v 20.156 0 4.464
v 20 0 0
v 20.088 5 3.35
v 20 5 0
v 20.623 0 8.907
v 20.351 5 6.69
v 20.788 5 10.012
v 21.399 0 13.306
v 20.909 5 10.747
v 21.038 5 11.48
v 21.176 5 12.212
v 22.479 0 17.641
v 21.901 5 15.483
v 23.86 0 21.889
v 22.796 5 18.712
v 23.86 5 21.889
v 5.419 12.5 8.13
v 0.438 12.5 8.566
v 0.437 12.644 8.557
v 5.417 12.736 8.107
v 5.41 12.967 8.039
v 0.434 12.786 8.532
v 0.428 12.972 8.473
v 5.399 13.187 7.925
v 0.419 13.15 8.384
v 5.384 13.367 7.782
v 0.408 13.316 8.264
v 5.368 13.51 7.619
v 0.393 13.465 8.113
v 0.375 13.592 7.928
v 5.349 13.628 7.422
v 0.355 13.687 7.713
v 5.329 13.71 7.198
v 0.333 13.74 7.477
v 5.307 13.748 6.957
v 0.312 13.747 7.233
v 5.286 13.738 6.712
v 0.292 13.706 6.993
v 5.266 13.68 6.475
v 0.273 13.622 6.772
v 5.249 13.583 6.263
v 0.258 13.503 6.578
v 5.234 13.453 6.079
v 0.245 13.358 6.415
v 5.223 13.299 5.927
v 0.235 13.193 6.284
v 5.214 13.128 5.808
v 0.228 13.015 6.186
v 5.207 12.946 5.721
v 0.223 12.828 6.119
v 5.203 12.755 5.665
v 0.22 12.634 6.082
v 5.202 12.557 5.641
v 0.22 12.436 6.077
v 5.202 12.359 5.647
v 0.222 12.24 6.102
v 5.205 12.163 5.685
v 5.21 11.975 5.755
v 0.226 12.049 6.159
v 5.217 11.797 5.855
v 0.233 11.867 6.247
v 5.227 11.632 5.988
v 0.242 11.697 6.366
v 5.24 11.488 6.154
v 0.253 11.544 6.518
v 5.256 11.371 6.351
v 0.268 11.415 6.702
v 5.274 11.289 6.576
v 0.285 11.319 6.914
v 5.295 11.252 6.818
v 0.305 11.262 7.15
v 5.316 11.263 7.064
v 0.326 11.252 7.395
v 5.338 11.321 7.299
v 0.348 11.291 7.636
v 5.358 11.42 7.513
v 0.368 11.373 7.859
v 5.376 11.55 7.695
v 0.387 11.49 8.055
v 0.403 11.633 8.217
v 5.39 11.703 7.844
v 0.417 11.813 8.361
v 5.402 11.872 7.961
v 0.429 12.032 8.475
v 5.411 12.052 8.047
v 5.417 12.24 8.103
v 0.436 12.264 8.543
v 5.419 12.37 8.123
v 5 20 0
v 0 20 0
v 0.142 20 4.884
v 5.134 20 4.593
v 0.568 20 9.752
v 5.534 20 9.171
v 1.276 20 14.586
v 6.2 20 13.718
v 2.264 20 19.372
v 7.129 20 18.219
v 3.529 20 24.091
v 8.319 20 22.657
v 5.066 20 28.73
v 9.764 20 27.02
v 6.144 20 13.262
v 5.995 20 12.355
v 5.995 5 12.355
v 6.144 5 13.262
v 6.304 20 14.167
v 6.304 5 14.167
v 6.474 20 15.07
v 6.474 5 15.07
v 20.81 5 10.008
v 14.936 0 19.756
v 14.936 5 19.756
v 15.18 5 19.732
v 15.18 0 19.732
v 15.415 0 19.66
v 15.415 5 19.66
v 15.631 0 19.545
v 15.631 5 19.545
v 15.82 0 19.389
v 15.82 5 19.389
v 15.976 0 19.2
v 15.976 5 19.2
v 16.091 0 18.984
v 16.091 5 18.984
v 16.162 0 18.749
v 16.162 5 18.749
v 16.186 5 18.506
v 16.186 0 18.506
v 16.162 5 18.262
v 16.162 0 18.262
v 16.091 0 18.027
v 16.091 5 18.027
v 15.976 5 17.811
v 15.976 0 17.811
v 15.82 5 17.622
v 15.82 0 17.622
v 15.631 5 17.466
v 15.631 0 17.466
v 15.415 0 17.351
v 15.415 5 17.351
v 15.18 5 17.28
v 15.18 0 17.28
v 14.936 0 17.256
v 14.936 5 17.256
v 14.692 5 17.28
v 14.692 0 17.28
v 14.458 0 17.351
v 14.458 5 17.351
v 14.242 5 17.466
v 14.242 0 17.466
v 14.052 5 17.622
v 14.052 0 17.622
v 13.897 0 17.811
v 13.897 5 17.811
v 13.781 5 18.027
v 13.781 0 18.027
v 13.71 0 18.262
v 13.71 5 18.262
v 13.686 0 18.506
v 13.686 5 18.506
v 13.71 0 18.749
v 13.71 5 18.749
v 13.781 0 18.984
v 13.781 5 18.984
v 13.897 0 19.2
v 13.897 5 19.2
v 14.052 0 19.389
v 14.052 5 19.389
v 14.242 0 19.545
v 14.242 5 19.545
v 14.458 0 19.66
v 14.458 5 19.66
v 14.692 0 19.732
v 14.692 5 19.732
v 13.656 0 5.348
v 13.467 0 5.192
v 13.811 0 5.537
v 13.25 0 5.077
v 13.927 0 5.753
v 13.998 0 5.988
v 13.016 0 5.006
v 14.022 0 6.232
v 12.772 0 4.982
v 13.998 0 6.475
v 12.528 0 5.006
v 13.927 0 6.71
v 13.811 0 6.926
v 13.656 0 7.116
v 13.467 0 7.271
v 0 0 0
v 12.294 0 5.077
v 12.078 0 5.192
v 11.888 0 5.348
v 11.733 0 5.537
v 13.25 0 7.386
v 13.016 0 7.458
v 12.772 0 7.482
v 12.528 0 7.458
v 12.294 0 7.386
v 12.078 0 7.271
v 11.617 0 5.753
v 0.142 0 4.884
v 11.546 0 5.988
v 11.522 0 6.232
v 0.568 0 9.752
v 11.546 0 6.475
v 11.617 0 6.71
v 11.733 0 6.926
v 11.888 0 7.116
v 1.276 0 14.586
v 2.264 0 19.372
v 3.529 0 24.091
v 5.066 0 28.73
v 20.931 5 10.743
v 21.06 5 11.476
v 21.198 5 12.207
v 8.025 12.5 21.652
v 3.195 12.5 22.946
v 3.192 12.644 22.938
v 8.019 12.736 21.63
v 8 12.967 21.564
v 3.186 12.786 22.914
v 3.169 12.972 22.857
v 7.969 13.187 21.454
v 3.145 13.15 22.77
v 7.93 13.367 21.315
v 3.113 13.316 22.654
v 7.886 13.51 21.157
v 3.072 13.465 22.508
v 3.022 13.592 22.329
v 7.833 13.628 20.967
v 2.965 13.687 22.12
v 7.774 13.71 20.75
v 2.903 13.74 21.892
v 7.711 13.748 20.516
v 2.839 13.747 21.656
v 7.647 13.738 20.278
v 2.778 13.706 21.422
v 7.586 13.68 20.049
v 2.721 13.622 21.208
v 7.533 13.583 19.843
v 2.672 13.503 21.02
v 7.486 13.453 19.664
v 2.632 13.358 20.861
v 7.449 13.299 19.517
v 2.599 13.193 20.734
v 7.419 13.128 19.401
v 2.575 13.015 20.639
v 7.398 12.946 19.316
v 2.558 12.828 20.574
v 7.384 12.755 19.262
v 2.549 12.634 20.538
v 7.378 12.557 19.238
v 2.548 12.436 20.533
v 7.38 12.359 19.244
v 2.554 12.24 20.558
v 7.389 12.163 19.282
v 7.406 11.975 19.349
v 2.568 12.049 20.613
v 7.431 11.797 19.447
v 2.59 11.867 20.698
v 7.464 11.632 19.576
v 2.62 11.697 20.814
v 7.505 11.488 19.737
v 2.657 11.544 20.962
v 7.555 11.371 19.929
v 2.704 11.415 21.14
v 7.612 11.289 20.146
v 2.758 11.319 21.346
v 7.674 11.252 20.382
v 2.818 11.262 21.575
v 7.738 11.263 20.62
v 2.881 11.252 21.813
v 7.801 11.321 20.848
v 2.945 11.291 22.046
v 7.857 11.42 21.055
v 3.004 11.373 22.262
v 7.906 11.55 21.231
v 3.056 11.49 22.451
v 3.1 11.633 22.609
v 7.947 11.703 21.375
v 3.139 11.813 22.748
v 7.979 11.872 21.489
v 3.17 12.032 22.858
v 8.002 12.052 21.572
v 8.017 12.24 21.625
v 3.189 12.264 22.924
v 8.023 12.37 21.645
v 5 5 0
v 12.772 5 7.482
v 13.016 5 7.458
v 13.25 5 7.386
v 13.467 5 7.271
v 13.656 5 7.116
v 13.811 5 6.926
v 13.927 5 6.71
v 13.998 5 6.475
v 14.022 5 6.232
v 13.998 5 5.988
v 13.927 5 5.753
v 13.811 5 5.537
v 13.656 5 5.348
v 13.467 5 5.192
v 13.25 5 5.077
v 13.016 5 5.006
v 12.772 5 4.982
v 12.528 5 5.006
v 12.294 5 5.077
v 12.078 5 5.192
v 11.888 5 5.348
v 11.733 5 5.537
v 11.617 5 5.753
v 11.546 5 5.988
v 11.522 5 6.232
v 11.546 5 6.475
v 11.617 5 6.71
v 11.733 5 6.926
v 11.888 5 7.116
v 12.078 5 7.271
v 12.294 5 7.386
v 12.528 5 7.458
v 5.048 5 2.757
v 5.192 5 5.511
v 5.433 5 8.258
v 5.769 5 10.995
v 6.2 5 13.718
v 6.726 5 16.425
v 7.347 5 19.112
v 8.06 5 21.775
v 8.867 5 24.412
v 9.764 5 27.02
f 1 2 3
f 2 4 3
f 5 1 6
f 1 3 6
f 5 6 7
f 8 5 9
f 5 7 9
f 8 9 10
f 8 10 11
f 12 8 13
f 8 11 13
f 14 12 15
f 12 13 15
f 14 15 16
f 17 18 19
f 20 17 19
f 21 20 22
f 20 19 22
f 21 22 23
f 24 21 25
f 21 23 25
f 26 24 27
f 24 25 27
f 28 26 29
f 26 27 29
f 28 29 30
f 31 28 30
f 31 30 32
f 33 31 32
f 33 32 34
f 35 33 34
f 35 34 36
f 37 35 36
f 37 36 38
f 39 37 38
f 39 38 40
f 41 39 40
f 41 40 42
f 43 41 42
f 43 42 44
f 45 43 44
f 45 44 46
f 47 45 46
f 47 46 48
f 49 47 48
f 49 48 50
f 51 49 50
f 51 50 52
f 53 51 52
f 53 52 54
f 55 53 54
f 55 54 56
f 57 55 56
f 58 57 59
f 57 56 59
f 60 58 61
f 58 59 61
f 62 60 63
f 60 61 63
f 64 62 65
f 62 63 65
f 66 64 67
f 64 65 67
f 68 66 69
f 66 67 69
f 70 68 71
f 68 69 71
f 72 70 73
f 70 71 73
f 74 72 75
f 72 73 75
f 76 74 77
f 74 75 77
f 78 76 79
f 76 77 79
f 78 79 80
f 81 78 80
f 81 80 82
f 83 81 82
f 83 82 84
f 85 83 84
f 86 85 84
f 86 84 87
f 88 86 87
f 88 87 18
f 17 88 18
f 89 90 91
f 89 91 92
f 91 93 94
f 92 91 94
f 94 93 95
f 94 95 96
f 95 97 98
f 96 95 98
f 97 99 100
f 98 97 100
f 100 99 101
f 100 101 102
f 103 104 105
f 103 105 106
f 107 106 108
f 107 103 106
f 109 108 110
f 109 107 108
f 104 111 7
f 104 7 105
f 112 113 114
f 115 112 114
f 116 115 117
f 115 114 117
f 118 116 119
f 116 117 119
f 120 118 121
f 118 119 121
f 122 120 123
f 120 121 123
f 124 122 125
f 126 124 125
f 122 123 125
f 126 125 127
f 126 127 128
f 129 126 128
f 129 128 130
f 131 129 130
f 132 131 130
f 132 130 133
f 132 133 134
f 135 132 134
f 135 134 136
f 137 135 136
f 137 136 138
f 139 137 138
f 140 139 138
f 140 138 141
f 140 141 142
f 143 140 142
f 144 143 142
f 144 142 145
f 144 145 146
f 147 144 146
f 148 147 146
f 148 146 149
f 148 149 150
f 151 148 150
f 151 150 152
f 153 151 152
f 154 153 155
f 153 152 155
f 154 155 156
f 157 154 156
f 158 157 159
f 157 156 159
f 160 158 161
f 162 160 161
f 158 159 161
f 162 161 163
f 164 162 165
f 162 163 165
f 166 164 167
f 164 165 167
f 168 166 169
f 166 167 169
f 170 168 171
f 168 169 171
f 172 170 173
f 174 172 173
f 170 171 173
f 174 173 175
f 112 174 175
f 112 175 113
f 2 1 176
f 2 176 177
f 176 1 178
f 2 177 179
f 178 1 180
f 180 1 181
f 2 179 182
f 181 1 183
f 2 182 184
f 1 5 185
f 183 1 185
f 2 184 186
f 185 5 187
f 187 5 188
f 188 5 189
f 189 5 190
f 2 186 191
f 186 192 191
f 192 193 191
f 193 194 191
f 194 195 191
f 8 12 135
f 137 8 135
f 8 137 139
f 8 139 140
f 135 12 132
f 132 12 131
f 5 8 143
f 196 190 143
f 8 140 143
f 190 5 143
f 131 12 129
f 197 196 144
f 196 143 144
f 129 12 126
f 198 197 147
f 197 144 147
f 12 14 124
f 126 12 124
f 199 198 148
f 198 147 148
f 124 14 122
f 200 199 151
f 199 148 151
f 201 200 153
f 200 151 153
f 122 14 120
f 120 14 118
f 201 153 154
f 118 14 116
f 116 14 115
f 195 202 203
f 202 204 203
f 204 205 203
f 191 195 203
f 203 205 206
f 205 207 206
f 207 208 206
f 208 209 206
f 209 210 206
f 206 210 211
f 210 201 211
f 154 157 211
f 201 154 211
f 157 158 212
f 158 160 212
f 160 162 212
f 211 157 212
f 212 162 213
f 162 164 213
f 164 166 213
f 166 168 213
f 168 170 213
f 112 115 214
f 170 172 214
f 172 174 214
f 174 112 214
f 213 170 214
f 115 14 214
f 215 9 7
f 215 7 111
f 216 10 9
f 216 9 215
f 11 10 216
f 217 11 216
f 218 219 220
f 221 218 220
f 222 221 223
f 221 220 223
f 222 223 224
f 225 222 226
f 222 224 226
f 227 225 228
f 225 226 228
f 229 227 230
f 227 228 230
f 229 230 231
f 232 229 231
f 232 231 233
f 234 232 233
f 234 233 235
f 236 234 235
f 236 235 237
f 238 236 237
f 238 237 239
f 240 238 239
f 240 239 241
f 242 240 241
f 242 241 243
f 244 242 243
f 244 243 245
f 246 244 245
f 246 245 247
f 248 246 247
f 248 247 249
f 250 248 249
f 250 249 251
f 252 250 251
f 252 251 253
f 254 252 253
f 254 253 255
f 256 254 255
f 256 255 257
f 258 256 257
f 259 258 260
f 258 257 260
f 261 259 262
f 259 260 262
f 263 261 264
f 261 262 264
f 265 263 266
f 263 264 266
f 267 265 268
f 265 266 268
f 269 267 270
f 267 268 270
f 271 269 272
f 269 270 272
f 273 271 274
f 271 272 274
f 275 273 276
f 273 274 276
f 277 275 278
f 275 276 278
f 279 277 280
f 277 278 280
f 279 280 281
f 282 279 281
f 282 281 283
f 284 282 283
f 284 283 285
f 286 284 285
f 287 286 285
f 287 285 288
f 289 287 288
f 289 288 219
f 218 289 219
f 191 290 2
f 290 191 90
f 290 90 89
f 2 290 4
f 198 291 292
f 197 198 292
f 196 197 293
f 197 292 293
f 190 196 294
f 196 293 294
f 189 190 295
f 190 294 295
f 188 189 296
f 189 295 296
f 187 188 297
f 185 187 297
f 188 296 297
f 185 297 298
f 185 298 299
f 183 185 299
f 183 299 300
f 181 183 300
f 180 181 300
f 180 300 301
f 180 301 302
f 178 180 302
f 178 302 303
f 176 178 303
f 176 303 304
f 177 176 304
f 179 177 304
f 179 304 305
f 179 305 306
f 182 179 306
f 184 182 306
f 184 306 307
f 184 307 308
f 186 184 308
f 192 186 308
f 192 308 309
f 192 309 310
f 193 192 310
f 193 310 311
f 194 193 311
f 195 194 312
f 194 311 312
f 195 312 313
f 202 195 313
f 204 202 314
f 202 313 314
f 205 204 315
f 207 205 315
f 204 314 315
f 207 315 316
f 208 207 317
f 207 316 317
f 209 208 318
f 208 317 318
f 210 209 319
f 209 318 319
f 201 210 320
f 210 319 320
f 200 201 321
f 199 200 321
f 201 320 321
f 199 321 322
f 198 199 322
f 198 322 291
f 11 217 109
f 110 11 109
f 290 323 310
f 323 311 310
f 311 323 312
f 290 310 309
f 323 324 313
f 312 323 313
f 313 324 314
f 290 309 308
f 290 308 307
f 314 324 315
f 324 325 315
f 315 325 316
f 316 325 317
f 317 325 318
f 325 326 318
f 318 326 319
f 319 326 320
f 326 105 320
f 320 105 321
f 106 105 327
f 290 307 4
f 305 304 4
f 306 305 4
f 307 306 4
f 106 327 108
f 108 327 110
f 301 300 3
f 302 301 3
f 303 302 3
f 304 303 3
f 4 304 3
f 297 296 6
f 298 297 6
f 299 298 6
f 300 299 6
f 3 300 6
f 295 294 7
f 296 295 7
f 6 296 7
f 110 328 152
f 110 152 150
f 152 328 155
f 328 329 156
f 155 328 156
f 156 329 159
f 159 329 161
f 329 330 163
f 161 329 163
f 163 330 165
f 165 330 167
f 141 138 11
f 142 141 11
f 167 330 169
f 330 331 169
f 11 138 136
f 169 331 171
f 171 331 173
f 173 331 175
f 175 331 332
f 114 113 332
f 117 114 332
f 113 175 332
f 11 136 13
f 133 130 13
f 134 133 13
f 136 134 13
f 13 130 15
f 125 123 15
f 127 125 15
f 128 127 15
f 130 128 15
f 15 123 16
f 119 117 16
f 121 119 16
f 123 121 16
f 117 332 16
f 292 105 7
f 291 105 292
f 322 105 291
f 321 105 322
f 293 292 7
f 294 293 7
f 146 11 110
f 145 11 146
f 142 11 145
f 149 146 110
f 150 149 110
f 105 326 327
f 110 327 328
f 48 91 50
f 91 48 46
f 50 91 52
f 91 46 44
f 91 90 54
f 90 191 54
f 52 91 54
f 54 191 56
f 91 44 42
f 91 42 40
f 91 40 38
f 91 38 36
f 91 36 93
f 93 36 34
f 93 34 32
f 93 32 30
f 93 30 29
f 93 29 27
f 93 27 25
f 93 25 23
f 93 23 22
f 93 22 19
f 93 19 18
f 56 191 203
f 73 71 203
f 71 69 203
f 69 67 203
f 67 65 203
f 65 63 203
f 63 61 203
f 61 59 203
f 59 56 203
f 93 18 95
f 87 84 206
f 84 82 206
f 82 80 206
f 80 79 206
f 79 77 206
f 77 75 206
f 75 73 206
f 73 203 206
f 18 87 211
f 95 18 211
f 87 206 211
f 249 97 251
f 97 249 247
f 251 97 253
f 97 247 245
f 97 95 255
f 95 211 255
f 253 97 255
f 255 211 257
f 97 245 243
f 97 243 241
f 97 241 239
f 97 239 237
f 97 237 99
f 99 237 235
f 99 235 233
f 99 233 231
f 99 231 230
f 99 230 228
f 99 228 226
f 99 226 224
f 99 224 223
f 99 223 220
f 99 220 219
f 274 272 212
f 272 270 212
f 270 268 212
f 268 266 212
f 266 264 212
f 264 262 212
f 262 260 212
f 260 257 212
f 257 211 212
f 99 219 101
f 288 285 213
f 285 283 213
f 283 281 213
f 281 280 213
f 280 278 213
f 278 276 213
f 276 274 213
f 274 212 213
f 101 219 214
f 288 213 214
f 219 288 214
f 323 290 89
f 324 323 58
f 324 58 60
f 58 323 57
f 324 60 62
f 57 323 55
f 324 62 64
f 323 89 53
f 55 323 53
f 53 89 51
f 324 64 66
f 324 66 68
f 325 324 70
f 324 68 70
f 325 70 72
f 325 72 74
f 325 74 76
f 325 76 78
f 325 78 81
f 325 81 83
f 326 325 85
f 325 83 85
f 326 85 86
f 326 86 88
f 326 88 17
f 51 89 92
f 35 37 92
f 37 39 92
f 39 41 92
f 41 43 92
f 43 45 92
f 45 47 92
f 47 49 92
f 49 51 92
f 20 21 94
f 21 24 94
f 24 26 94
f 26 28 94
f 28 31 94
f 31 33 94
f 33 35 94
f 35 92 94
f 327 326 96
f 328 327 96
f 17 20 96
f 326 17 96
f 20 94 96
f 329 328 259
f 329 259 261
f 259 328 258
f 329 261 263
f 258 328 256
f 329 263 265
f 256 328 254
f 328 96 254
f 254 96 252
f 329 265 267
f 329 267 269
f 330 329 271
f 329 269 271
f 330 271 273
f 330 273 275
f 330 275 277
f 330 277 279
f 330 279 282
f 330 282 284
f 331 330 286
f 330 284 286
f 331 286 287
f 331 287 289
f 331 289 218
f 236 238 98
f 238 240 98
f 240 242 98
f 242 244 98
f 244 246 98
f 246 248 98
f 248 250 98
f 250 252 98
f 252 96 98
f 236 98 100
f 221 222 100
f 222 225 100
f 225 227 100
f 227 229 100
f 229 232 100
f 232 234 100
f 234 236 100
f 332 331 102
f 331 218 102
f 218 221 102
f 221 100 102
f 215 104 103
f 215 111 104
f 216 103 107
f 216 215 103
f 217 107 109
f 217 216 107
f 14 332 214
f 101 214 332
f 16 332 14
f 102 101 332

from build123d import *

# Parameters (mm, degrees)
R_VOLUTION1_ANGLE            = 20
ESQUISSE4_R                  = 1.25
ENL_V_MAT_EXTRU_1_DEPTH      = 10
ESQUISSE7_R                  = 1.25
ENL_V_MAT_EXTRU_2_DEPTH      = 10
R_P_TITION_CIRCULAIRE1_COUNT = 2
R_P_TITION_CIRCULAIRE1_ANGLE = 10
R_VOLUTION2_ANGLE            = 1
R_VOLUTION2_OTHER_WAY_ANGLE  = 1


with BuildPart() as part:
    # Esquisse2 → Révolution1 (revolve)
    with BuildSketch(Plane.XY):
        Polygon((0, 0), (20, 0), (20, 5), (5, 5), (5, 20), (0, 20), align=None)
    revolve(axis=Axis((84, 0, 0), (0, 1, 0)), revolution_arc=R_VOLUTION1_ANGLE)

    # Esquisse4 → Enlèv. mat.-Extru.1 (cut)
    with BuildSketch(Plane(origin=(0, 5, 0), x_dir=(1, 0, 0), z_dir=(0, 1, 0))):
        with Locations(Location((14.93630342, -18.505561725, 0), (0, 0, 270))):
            Circle(ESQUISSE4_R)
        with Locations(Location((12.772079086, -6.231635606, 0), (0, 0, 270))):
            Circle(ESQUISSE4_R)
    extrude(amount=-ENL_V_MAT_EXTRU_1_DEPTH, mode=Mode.SUBTRACT)

    # Esquisse7 → Enlèv. mat.-Extru.2 (cut)
    with BuildSketch(Plane(origin=(-0.318429013, 0, 0.027858929), x_dir=(0, -1, 0), z_dir=(-0.9961946980917459, 0, 0.08715574274765504))):
        with Locations(Location((-12.5, 7.321082391, 0), (0, 0, 90))):
            Circle(ESQUISSE7_R)
    enl_v_mat_extru_2 = extrude(amount=-ENL_V_MAT_EXTRU_2_DEPTH, mode=Mode.SUBTRACT)

    # Répétition circulaire1: Enlèv. mat.-Extru.2 ×2 about axis
    r_p_tition_circulaire1_axis = Axis((84, 0, 0), (0, 1, 0))
    for i in range(1, R_P_TITION_CIRCULAIRE1_COUNT):
        add(enl_v_mat_extru_2.rotate(r_p_tition_circulaire1_axis, i * R_P_TITION_CIRCULAIRE1_ANGLE / (R_P_TITION_CIRCULAIRE1_COUNT - 1)), mode=Mode.SUBTRACT)

    # Esquisse9 → Révolution2 (revolve)
    with BuildSketch(Plane(origin=(2.532909927, 0, 14.36484602), x_dir=(-0.9848077530122081, 0, 0.17364817766693072), z_dir=(-0.17364817766693072, 0, -0.9848077530122081))):
        Polygon((-3.746639624, 5), (-3.746639624, 20), (-18.746639624, 5), align=None)
    revolve(axis=Axis((84, 0, 0), (0, -1, 0)), revolution_arc=R_VOLUTION2_ANGLE)

    # Esquisse9 → Révolution2 other way (revolve)
    with BuildSketch(Plane(origin=(2.532909927, 0, 14.36484602), x_dir=(-0.9848077530122081, 0, 0.17364817766693072), z_dir=(-0.17364817766693072, 0, -0.9848077530122081))):
        Polygon((-3.746639624, 5), (-3.746639624, 20), (-18.746639624, 5), align=None)
    revolve(axis=Axis((84, 0, 0), (0, 1, 0)), revolution_arc=R_VOLUTION2_OTHER_WAY_ANGLE)


solid = part.part
